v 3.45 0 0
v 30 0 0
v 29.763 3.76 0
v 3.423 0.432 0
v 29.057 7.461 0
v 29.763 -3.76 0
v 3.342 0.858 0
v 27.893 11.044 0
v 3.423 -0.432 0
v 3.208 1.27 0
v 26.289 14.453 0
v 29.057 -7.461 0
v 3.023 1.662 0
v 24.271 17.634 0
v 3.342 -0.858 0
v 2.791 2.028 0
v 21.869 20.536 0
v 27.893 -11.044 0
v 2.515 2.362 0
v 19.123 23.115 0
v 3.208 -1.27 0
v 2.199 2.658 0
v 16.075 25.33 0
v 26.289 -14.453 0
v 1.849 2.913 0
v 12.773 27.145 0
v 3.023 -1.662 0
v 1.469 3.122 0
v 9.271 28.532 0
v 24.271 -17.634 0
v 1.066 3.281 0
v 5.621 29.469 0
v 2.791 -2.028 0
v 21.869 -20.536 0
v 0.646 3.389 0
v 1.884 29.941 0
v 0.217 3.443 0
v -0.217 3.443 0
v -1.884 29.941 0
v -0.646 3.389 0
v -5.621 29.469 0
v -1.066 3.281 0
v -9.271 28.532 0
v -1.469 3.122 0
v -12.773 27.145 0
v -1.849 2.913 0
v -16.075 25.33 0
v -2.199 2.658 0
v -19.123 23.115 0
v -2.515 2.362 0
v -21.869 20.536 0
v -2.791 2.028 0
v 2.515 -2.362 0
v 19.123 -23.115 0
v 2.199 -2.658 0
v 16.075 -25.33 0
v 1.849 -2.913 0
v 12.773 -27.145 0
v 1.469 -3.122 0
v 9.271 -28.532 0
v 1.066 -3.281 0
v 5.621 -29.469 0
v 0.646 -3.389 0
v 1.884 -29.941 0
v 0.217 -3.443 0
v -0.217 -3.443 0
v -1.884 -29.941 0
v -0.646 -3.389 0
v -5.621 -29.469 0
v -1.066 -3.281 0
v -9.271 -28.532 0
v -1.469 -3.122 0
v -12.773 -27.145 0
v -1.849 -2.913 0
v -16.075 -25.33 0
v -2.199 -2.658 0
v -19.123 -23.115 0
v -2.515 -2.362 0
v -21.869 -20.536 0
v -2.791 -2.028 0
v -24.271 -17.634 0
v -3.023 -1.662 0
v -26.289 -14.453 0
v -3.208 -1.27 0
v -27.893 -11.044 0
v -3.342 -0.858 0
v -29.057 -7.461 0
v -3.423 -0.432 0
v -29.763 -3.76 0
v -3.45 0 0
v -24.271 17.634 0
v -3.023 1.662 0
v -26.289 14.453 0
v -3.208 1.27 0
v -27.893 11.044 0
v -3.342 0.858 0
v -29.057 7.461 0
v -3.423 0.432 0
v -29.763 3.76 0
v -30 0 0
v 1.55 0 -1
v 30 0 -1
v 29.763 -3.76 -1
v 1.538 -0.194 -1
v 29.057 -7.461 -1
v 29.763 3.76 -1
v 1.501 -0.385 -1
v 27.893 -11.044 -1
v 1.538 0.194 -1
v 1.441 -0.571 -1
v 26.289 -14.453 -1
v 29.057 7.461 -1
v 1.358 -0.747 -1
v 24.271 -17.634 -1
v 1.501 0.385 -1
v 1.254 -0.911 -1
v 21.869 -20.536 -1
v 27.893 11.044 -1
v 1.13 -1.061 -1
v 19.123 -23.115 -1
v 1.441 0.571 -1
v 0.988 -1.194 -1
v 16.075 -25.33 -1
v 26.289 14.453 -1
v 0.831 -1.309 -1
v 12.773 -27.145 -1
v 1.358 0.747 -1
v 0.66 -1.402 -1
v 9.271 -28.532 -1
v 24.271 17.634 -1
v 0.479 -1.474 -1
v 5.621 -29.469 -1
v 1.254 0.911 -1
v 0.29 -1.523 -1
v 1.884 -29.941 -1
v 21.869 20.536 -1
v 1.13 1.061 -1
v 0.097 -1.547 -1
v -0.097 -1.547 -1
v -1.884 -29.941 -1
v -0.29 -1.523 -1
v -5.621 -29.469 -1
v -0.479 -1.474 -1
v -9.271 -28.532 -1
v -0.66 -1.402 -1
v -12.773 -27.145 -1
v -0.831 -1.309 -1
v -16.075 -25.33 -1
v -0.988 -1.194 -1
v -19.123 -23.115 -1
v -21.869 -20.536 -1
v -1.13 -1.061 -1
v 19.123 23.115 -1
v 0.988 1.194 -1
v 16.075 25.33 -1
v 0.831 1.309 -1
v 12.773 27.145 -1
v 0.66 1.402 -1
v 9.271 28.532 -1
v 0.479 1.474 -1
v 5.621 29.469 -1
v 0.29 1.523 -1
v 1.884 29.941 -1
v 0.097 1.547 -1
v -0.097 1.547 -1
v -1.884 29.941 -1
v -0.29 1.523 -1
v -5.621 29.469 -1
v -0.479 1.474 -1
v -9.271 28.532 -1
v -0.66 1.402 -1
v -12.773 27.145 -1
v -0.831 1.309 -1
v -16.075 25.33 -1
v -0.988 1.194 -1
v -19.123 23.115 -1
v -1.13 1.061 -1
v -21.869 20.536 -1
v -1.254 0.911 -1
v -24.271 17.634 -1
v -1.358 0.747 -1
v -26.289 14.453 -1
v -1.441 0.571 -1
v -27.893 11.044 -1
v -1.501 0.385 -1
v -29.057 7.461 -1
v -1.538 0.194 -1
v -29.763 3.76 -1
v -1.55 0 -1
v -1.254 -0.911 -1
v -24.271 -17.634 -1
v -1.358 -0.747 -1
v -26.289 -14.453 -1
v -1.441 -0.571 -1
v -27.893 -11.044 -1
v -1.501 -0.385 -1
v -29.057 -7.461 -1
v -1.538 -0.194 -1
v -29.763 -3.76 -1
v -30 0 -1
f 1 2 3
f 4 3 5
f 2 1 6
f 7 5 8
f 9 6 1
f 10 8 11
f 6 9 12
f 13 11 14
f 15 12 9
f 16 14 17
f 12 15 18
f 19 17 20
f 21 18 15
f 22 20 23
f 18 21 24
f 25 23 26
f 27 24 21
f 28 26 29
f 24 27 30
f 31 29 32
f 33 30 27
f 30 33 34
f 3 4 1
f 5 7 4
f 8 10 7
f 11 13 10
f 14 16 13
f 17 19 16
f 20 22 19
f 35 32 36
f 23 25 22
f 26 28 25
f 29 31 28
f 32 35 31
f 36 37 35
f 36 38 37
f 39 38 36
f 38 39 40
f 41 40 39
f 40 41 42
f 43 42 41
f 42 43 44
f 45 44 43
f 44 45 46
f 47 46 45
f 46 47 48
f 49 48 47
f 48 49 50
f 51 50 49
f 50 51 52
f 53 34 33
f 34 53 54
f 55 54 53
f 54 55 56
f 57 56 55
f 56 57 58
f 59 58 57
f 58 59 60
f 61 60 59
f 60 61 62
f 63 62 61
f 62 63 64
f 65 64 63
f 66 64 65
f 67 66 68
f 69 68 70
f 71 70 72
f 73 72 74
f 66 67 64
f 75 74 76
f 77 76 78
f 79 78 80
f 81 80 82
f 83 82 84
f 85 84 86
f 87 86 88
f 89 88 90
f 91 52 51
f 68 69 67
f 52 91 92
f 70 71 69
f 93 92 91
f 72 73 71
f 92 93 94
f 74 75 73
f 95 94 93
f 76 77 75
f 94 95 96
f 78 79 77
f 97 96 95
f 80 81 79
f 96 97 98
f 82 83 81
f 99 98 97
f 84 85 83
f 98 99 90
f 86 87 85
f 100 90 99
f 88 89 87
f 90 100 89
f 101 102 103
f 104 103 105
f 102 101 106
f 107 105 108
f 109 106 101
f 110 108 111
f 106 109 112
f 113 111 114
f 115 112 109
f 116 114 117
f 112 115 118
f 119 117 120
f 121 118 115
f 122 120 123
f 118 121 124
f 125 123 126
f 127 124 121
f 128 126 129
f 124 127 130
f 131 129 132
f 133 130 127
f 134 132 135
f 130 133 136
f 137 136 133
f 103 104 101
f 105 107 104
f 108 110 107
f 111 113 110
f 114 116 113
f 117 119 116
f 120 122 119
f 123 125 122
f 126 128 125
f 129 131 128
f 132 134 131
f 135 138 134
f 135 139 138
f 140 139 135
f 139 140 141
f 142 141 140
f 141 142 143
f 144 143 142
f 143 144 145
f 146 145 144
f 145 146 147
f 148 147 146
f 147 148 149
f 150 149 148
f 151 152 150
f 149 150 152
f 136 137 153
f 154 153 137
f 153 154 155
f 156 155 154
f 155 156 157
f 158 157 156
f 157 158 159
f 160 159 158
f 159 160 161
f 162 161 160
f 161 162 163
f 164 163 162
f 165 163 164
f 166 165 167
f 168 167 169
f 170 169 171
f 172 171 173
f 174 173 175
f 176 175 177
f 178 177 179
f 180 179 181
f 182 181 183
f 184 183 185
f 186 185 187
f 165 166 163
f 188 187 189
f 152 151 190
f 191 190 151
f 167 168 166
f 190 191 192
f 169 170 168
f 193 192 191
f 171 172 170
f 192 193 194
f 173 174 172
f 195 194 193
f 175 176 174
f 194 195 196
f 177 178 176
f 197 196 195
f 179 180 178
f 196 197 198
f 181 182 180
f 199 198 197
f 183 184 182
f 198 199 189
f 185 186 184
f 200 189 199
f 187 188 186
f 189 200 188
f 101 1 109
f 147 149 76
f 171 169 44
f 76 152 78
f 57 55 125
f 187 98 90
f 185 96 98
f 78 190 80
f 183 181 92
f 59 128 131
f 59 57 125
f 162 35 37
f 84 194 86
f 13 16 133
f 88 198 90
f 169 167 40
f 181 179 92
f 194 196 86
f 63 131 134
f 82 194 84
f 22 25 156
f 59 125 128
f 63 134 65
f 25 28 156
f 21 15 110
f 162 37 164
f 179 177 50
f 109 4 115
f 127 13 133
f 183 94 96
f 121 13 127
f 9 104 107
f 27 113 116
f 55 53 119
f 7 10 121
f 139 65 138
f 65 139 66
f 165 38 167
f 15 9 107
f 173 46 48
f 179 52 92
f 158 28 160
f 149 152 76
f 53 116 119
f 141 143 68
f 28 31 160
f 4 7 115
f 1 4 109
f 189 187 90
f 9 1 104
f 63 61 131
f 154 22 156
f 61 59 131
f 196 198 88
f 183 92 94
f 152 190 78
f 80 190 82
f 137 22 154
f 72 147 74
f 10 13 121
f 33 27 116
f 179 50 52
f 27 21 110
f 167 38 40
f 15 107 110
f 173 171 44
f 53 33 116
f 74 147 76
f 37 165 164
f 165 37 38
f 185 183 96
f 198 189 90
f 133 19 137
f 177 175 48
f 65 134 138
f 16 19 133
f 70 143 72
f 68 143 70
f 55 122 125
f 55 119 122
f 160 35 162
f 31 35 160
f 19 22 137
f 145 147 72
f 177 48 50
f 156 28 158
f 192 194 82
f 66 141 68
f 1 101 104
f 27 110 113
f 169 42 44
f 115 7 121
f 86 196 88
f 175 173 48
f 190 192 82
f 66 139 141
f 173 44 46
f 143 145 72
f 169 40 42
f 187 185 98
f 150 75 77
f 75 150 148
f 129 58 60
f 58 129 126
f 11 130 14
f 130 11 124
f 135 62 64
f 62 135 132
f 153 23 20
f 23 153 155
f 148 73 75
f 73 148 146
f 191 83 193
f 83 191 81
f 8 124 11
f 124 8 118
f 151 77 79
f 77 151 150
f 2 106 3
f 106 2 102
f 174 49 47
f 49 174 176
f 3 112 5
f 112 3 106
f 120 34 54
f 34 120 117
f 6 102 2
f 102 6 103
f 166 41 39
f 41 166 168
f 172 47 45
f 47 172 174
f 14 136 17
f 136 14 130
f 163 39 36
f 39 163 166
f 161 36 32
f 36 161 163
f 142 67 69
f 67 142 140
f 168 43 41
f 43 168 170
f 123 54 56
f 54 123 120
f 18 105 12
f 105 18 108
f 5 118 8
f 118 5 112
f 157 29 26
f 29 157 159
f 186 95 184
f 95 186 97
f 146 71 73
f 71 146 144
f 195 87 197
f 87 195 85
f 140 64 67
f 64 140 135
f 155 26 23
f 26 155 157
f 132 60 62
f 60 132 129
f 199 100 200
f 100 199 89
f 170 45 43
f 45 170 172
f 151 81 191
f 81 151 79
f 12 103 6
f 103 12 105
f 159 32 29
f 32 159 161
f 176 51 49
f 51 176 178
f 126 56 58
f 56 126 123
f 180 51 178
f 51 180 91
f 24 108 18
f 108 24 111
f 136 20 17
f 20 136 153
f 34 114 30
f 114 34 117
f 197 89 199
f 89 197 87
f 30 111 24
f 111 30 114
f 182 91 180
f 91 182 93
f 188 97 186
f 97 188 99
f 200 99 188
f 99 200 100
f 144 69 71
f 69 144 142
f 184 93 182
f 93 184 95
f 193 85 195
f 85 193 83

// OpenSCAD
$fn = 50;


difference() {
	union() {
		translate(v = [0, 0, -1.0000000000]) {
			cylinder(h = 1.0000000000, r = 30.0000000000);
		}
	}
	union() {
		translate(v = [0, 0, 0]) {
			rotate(a = [0, 0, 0]) {
				difference() {
					union() {
						translate(v = [0, 0, -1.0000000000]) {
							cylinder(h = 1.0000000000, r = 1.2500000000);
						}
						translate(v = [0, 0, -1.0000000000]) {
							cylinder(h = 1.0000000000, r1 = 1.5500000000, r2 = 3.4500000000);
						}
						translate(v = [0, 0, -1.0000000000]) {
							cylinder(h = 1.0000000000, r = 1.5500000000);
						}
						translate(v = [0, 0, -1.0000000000]) {
							cylinder(h = 1.0000000000, r = 1.2500000000);
						}
					}
					union();
				}
			}
		}
	}
}
